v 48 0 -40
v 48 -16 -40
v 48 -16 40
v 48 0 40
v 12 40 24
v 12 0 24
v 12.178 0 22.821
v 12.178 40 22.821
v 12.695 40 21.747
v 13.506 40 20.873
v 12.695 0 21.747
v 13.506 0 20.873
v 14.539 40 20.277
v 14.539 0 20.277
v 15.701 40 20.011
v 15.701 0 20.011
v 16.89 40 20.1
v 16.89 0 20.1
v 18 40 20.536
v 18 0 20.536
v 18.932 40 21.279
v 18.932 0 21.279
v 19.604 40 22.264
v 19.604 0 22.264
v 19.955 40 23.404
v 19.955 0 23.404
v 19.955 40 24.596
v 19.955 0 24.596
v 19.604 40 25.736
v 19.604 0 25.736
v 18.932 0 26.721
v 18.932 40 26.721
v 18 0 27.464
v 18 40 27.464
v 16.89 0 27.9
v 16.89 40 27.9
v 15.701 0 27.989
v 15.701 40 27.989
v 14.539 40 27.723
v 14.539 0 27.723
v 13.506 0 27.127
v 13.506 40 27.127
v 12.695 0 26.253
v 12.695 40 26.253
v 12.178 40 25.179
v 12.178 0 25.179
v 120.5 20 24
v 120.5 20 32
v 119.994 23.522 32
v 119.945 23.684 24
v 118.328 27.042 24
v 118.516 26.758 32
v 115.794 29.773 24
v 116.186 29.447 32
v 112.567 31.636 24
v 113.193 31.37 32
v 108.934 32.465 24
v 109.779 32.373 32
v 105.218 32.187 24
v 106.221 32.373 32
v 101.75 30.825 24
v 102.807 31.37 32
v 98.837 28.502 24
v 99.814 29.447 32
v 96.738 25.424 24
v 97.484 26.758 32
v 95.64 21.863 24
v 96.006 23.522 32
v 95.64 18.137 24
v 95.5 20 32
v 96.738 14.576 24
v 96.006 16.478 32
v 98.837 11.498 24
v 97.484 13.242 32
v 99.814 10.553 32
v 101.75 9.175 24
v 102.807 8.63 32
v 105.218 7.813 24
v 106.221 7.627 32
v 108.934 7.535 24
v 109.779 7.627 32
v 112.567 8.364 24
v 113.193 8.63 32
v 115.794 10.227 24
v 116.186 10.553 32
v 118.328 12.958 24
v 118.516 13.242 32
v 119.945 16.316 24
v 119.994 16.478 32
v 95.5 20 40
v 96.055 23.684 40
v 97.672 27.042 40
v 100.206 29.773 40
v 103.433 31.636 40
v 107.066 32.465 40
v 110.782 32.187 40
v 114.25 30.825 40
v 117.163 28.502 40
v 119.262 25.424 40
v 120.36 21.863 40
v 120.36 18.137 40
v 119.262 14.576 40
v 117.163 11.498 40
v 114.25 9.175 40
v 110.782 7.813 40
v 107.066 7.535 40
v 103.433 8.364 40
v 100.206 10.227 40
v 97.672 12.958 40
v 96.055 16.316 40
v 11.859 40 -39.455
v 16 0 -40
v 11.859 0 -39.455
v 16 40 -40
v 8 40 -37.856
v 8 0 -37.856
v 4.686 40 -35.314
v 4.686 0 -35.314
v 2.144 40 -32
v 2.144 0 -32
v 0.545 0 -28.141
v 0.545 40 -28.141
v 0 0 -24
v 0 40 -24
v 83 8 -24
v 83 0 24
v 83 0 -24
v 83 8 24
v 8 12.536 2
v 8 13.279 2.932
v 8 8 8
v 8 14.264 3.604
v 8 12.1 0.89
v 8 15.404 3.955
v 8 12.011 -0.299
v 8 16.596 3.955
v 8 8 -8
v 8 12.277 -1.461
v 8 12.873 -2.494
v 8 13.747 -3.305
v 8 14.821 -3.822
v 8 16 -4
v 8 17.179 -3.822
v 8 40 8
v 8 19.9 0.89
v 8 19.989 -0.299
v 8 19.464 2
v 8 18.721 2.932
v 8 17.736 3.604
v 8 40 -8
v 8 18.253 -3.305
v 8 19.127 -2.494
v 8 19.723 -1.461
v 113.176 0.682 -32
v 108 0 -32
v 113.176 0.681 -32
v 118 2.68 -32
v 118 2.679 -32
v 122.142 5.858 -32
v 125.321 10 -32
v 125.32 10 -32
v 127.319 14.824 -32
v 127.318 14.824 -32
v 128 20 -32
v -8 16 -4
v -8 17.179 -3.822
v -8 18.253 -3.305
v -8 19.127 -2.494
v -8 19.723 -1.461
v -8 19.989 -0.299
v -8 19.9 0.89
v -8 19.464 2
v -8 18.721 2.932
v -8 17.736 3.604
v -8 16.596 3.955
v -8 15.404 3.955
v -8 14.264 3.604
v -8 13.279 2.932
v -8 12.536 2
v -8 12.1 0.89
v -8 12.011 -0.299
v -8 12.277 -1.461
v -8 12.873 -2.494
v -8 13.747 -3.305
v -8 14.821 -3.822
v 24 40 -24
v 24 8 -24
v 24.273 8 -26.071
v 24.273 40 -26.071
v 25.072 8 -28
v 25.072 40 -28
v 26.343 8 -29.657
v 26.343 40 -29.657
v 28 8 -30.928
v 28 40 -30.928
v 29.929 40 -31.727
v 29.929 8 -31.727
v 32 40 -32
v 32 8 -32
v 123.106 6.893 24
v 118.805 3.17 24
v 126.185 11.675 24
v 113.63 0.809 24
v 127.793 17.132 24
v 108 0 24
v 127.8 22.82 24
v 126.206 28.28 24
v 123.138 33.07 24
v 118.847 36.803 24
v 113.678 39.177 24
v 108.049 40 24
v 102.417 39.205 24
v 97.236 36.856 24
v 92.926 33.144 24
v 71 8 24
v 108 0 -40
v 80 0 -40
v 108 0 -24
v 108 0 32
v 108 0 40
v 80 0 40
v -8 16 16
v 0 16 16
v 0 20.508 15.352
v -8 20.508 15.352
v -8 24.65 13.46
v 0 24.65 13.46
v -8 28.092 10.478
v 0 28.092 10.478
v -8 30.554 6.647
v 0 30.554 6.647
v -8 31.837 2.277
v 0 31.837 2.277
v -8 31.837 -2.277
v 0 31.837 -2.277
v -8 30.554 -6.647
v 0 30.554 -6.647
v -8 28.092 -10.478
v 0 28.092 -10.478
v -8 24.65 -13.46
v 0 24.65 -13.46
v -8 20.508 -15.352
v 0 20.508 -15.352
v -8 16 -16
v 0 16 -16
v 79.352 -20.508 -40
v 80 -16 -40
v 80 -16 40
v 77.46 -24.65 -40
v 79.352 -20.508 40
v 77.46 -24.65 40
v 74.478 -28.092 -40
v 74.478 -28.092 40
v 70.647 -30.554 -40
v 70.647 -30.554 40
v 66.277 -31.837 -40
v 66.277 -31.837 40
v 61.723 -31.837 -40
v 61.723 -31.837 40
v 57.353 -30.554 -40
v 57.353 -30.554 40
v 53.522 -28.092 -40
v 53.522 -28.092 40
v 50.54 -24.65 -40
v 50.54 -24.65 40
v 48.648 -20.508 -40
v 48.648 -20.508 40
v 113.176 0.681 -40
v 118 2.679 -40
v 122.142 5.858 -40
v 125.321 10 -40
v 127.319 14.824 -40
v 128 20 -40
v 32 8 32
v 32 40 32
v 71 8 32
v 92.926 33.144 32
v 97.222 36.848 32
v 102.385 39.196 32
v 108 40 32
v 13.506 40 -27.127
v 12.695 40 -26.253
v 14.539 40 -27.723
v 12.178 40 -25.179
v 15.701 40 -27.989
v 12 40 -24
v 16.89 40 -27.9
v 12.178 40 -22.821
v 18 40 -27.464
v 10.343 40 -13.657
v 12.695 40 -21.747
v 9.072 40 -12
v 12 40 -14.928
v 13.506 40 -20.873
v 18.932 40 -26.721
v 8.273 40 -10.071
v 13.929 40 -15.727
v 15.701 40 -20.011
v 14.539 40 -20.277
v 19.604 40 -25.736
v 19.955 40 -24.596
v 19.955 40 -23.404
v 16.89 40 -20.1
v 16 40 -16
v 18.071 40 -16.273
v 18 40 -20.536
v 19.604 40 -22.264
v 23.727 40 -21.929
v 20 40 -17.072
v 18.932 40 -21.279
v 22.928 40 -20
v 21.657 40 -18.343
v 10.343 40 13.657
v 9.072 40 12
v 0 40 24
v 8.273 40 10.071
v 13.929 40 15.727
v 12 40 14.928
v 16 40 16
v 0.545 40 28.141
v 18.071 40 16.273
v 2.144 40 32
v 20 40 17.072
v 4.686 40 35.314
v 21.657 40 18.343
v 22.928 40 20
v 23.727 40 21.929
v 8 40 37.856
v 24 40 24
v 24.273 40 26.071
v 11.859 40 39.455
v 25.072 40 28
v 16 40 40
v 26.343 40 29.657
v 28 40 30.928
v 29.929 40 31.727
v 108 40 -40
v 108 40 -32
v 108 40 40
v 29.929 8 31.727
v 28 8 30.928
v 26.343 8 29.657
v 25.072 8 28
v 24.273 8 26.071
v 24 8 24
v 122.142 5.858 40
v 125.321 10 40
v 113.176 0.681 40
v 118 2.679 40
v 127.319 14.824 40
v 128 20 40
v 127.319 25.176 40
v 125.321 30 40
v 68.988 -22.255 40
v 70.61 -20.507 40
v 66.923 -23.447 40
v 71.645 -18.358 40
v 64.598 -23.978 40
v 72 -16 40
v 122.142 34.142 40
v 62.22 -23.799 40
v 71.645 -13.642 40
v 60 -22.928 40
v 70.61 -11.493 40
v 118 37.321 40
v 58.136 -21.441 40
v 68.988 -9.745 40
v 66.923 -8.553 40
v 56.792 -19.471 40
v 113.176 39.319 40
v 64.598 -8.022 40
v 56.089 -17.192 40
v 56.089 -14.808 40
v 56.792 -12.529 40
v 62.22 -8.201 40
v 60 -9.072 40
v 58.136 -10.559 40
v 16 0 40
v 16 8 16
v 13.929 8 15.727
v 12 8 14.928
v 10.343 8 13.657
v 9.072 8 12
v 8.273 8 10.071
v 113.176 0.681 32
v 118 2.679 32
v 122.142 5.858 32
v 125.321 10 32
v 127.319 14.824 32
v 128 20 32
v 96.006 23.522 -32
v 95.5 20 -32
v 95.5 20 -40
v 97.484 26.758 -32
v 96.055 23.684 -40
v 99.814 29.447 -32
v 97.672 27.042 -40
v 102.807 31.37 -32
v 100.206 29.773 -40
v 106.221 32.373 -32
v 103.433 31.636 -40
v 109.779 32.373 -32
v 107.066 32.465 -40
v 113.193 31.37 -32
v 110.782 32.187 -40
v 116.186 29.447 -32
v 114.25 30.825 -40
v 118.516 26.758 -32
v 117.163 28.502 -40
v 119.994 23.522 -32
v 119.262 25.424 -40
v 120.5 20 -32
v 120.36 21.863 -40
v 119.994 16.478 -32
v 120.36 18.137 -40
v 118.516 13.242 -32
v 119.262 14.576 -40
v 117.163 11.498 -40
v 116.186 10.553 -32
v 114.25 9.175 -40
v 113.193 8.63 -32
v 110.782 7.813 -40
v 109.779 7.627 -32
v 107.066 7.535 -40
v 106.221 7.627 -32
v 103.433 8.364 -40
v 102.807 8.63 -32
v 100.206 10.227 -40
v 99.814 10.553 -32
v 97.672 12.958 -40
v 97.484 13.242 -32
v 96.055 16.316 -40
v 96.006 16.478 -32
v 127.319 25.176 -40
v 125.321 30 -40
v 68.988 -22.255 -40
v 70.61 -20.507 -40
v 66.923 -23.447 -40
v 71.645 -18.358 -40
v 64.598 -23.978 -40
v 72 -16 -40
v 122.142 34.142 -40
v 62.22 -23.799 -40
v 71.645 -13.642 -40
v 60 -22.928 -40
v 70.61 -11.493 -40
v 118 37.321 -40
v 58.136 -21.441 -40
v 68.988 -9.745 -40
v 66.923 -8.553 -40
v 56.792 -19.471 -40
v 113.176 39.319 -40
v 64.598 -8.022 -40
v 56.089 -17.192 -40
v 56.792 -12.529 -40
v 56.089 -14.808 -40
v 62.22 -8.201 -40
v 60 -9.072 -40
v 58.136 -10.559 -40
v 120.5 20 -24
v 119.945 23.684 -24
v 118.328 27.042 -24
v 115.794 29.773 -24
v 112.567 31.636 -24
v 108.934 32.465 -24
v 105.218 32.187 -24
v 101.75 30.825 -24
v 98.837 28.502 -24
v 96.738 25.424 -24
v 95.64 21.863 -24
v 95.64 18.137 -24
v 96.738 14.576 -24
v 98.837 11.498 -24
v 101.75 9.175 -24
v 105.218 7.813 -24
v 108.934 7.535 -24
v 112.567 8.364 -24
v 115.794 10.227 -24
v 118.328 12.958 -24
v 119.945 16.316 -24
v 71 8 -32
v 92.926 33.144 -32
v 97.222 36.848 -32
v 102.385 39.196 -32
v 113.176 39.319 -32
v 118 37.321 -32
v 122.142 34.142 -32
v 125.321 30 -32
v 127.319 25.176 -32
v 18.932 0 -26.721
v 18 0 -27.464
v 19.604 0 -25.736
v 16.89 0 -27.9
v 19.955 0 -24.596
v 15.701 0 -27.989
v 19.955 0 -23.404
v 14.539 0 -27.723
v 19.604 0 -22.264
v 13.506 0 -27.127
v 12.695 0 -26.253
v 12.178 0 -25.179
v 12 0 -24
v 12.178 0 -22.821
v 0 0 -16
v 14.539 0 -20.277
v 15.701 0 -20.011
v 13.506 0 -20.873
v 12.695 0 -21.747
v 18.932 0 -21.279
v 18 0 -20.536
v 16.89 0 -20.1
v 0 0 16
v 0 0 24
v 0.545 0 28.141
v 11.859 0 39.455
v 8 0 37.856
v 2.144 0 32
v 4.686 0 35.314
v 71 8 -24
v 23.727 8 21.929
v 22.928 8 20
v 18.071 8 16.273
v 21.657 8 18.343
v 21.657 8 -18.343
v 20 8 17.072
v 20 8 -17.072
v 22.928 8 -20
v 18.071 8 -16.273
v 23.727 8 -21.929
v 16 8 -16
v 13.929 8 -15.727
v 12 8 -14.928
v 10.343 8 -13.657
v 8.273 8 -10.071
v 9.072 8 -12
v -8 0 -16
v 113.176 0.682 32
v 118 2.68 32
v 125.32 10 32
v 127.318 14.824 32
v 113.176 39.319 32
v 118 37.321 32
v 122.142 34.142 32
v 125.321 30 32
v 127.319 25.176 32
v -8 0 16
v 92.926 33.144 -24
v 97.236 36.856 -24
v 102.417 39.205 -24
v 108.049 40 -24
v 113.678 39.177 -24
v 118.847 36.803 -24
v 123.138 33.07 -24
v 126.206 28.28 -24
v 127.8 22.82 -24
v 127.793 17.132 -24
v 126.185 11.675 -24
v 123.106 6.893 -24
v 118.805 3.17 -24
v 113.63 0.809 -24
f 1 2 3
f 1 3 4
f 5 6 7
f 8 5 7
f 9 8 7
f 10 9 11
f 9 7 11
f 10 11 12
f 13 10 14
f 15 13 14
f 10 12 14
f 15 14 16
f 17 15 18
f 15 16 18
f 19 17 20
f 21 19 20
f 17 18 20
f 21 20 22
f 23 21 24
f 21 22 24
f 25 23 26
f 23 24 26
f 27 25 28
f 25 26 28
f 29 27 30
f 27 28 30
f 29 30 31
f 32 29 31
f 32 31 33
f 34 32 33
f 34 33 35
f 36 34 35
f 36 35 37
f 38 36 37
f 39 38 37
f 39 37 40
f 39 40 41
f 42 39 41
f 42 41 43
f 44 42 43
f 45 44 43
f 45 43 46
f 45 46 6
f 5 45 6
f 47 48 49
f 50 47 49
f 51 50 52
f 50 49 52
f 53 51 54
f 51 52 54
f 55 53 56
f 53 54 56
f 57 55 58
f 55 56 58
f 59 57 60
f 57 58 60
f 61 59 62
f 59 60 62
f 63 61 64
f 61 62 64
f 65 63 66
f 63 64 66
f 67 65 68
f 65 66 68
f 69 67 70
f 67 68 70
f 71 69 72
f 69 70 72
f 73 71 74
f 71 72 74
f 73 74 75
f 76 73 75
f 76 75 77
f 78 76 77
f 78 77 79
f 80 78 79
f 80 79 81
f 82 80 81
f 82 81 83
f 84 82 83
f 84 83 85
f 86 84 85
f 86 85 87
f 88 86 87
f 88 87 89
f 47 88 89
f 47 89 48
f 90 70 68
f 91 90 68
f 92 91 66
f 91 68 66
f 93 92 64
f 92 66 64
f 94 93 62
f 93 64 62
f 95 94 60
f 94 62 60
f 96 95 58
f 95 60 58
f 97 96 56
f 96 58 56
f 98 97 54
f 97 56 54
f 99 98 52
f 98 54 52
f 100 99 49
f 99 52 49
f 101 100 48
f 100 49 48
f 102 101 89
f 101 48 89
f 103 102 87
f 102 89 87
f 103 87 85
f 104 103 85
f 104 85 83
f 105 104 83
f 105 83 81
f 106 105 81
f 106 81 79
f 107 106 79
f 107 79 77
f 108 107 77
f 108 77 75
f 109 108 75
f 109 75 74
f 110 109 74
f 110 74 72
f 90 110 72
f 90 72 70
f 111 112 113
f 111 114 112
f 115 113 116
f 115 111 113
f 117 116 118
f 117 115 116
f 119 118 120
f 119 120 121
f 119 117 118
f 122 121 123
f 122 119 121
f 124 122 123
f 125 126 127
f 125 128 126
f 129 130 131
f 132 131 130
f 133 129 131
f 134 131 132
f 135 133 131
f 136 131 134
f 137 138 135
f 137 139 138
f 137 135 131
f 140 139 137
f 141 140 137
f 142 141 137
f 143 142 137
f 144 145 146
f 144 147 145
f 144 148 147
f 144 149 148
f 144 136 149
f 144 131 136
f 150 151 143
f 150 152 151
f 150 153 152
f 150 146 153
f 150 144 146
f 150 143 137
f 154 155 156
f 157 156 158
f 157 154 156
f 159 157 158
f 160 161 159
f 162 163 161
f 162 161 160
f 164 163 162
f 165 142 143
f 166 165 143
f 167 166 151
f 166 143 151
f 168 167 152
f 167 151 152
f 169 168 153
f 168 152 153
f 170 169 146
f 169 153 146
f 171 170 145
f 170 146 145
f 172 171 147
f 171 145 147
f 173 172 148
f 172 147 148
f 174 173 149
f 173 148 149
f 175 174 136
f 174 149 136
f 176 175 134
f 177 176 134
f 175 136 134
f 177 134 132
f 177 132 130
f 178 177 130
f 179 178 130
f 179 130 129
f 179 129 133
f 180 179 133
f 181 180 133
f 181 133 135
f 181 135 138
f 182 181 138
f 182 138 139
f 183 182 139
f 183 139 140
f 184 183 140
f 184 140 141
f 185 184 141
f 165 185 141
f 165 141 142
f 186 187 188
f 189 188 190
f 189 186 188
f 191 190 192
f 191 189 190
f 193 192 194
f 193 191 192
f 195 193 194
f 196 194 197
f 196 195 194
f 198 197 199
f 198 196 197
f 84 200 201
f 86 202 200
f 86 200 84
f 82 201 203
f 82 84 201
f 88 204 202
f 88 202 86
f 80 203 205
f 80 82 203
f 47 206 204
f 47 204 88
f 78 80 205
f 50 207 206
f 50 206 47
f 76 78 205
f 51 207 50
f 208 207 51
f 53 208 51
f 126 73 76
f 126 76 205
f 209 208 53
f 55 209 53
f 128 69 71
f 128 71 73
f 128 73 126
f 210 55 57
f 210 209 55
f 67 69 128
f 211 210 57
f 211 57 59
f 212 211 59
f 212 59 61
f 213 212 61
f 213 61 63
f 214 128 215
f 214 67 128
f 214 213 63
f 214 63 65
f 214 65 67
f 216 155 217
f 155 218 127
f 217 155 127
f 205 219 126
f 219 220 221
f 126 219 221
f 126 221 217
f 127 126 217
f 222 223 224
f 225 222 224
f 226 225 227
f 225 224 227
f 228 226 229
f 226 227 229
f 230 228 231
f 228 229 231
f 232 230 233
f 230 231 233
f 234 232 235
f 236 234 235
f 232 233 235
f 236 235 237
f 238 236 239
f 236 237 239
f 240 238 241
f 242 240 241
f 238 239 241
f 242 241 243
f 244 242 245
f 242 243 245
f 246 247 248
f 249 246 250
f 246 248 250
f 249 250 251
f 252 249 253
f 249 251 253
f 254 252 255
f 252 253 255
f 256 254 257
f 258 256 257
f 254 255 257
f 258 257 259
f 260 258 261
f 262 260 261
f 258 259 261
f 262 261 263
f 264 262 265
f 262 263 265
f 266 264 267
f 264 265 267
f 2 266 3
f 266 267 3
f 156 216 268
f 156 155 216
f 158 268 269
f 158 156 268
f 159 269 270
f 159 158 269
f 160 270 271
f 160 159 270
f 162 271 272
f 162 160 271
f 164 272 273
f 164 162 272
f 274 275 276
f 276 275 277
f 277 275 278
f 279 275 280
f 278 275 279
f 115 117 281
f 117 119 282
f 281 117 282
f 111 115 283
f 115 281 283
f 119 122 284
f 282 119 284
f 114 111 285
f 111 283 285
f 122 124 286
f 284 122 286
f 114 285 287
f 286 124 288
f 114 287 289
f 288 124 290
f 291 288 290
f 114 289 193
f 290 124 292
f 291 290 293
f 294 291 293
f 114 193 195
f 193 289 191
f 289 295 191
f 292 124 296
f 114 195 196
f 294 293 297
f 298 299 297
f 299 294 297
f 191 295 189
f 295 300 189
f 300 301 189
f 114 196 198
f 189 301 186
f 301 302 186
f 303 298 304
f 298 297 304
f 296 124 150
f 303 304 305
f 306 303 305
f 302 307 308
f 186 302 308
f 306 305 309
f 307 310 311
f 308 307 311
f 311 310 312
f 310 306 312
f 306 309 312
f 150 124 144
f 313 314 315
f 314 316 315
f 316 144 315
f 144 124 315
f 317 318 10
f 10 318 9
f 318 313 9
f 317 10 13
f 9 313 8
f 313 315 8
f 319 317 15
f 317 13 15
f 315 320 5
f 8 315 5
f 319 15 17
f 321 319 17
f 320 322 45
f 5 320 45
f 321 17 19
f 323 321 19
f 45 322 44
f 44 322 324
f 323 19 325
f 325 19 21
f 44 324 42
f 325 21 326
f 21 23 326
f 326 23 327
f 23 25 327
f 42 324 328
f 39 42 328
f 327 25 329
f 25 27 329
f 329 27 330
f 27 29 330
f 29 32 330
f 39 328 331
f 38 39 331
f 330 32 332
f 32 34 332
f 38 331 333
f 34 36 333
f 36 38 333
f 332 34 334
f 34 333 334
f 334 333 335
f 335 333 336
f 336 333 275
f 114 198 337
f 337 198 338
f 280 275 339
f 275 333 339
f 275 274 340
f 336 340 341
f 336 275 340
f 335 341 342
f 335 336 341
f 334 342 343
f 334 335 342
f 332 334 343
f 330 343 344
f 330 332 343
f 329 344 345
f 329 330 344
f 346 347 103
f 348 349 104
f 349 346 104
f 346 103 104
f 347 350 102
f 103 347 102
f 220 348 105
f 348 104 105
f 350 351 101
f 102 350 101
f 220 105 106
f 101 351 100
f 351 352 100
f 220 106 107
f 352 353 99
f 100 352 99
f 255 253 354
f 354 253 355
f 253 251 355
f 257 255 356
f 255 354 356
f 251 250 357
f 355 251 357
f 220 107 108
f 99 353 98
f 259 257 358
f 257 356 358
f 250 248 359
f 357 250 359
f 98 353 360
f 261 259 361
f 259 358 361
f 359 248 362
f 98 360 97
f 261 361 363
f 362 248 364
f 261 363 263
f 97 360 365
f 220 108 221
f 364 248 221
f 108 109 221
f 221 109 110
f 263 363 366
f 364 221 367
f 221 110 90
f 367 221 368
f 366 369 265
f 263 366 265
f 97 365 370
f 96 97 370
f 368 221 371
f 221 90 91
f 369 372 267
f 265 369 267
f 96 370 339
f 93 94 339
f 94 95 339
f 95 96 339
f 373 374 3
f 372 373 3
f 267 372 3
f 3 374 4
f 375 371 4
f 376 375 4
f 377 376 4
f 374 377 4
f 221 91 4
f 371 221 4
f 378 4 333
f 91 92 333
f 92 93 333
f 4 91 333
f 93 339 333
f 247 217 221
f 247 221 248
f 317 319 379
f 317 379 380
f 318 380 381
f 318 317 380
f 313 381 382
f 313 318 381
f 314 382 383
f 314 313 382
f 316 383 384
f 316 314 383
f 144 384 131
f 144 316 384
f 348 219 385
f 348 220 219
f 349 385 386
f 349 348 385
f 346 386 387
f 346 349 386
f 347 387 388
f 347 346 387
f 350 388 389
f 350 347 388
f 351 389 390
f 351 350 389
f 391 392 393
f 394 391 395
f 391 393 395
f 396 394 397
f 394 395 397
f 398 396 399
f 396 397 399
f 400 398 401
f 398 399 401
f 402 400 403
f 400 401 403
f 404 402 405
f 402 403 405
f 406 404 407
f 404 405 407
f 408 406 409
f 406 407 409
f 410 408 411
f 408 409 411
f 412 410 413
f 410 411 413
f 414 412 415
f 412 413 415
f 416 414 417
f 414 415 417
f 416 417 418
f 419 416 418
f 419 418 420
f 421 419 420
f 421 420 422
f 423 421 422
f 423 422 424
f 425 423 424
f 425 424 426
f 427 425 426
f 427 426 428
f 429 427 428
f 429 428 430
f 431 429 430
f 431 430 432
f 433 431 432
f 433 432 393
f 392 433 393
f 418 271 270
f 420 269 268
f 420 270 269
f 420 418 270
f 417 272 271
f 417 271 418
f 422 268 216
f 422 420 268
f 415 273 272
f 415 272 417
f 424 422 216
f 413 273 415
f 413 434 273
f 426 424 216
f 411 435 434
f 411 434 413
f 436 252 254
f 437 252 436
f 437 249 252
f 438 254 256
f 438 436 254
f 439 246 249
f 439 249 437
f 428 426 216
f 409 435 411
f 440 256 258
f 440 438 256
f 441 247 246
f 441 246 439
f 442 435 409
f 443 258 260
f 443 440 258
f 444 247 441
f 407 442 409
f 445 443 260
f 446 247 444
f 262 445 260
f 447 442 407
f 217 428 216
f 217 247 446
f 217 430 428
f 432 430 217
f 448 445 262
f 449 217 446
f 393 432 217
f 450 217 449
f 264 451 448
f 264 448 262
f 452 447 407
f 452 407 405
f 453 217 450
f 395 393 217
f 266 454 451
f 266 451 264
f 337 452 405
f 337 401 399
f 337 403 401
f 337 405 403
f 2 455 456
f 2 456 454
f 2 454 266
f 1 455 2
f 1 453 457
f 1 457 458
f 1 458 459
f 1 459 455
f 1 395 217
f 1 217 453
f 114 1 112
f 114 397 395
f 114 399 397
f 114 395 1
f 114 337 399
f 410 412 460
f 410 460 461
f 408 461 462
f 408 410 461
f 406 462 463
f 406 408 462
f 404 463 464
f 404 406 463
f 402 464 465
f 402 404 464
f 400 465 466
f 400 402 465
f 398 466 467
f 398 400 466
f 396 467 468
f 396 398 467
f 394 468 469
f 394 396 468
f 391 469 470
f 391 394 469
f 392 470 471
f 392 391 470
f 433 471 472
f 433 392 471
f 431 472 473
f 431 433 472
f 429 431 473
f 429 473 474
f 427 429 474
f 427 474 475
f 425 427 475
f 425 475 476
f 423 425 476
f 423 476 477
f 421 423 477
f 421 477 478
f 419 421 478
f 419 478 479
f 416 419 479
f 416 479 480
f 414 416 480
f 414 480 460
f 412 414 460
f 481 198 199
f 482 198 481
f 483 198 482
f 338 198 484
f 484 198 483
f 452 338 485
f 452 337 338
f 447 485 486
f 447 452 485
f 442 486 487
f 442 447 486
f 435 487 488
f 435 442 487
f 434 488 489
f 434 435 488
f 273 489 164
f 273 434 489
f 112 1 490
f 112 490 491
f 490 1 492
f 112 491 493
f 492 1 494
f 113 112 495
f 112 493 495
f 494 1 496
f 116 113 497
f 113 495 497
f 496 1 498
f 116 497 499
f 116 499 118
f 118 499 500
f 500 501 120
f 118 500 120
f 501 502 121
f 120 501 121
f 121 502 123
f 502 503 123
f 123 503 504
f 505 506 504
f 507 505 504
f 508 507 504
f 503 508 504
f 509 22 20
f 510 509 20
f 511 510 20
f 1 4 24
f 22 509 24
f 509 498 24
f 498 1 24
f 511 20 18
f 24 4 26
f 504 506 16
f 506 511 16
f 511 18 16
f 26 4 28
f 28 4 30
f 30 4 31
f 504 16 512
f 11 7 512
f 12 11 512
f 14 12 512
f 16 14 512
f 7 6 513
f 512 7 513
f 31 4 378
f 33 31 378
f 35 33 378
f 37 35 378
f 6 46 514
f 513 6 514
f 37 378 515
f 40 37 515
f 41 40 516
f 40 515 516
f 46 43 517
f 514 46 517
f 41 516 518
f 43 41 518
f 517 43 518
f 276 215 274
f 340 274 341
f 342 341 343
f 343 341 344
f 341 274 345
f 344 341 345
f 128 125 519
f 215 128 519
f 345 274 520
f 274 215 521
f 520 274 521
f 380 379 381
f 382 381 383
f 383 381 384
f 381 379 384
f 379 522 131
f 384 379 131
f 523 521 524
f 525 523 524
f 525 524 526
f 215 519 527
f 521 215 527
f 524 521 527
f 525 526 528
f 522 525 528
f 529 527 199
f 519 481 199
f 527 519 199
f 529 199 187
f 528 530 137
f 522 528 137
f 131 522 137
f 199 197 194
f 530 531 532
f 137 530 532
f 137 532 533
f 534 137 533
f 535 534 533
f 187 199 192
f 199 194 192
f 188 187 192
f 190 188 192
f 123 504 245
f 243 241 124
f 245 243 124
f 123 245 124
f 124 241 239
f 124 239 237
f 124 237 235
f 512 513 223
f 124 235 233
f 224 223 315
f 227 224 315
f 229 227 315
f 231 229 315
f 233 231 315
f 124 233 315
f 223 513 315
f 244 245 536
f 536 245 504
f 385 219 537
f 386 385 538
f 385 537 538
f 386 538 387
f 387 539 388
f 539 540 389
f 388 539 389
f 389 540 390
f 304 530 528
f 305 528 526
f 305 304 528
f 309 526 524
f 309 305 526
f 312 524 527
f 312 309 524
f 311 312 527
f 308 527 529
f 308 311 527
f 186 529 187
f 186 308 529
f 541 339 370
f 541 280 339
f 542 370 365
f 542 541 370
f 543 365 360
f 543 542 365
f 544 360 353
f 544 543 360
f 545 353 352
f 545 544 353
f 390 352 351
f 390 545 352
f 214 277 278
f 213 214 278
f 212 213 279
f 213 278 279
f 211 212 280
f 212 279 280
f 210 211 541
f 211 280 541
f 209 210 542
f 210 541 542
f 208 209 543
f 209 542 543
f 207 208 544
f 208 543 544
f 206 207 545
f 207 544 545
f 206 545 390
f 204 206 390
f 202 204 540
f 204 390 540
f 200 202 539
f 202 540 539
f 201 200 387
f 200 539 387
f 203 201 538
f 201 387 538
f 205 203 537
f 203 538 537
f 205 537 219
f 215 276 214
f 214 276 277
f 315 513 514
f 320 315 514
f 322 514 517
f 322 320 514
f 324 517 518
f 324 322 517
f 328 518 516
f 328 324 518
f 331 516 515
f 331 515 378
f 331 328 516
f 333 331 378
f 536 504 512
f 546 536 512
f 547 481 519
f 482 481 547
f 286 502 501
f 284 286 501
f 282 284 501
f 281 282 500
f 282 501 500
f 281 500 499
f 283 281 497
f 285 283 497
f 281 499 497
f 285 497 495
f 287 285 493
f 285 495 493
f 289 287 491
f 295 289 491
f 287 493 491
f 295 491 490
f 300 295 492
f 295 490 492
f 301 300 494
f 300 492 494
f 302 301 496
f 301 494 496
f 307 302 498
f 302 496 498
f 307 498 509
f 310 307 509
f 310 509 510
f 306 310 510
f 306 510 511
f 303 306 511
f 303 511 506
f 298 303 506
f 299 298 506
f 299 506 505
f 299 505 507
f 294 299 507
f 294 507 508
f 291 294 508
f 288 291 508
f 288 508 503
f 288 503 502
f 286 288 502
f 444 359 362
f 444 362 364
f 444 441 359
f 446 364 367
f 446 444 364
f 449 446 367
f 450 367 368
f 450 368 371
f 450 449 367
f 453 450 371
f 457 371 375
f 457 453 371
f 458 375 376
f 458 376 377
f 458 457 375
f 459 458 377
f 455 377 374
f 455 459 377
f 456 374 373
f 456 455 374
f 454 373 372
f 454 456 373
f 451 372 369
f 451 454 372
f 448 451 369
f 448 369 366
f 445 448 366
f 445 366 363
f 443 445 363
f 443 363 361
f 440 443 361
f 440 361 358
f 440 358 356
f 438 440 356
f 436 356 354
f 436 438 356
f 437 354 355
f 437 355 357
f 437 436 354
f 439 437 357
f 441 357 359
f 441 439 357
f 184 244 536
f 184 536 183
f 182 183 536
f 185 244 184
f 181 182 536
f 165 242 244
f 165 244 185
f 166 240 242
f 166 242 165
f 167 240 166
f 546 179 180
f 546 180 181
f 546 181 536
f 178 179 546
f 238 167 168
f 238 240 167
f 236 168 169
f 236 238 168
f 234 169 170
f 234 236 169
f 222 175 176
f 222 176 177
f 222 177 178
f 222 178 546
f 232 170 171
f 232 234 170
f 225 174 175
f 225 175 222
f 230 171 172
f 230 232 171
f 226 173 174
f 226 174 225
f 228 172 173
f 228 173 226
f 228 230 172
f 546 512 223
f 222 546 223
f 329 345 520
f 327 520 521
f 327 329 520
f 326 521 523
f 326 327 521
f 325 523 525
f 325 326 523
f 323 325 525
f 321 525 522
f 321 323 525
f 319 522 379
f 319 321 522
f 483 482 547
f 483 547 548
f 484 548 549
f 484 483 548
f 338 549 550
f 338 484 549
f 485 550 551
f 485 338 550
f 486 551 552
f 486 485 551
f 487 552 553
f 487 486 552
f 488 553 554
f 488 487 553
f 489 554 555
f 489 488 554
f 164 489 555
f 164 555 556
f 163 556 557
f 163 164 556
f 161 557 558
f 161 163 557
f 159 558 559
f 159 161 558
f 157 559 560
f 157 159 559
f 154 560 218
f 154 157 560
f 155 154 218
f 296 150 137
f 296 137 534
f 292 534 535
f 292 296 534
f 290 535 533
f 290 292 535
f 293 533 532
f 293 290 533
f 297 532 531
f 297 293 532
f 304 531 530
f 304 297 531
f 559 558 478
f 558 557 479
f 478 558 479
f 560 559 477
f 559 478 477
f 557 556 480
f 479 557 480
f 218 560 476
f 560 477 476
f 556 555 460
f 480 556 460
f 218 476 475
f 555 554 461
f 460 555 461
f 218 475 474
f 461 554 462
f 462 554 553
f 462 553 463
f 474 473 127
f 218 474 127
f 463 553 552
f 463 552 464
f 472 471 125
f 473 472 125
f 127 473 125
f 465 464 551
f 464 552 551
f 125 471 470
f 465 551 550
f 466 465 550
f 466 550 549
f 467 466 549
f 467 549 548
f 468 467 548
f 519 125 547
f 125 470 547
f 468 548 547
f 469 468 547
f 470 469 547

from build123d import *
from build123d.topology import SkipClean

# Parameters (mm, degrees)
SKETCH1_R           = 8
BOSS_EXTRUDE1_DEPTH = 40
SKETCH2_W           = 45
SKETCH2_H           = 64
CUT_EXTRUDE1_DEPTH  = 80
FILLET1_R           = 20
HOLE1_D             = 25
FILLET2_R           = 16
HOLE2_D             = 8
CUT_EXTRUDE2_DEPTH  = 32
SKETCH8_R           = 12.5
BOSS_EXTRUDE2_DEPTH = 8
BOSS_EXTRUDE3_DEPTH = 8
HOLE3_D             = 8


with BuildPart() as part:
    # Sketch1 → Boss-Extrude1 (new, symmetric)
    with BuildSketch(Plane.XY):
        with BuildLine():
            Line((48, -16), (48, 0))
            Line((48, 0), (0, 0))
            Line((0, 0), (0, 40))
            Line((0, 40), (128, 40))
            Line((128, 40), (128, 0))
            Line((128, 0), (80, 0))
            Line((80, 0), (80, -16))
            ThreePointArc((80, -16), (64, -32), (48, -16))
        make_face()
        with Locations((64, -16)):
            Circle(SKETCH1_R, mode=Mode.SUBTRACT)
    extrude(amount=BOSS_EXTRUDE1_DEPTH, both=True)

    # Sketch2 → Cut-Extrude1 (cut)
    with BuildSketch(Plane(origin=(0, 40, 0), x_dir=(1, 0, 0), z_dir=(0, 1, 0))):
        with Locations((105.5, 0)):
            Rectangle(SKETCH2_W, SKETCH2_H)
    extrude(amount=-CUT_EXTRUDE1_DEPTH, mode=Mode.SUBTRACT)

    # Fillet1
    fillet1_edges = [part.edges().sort_by_distance(p)[0] for p in [
        (128, 0, 36),
        (128, 0, -36),
        (128, 40, -36),
        (128, 40, 36),
    ]]
    fillet(fillet1_edges, radius=FILLET1_R - 0.0001)  # a hair under: the kernel refuses the full size

    # Hole1 (through all)
    with Locations(Plane.XY.offset(40)):
        with Locations((108, 20)):
            Hole(HOLE1_D / 2)

    # Fillet2
    fillet2_edges = [part.edges().sort_by_distance(p)[0] for p in [
        (0, 20, -40),
        (0, 20, 40),
    ]]
    fillet(fillet2_edges, radius=FILLET2_R)

    # Hole2 (through all)
    with Locations(Plane(origin=(0, 40, 0), x_dir=(1, 0, 0), z_dir=(0, 1, 0))):
        with Locations((16, 24), (16, -24)):
            Hole(HOLE2_D / 2)

    # Sketch7 → Cut-Extrude2 (cut)
    with BuildSketch(Plane(origin=(0, 40, 0), x_dir=(1, 0, 0), z_dir=(0, 1, 0))):
        with BuildLine():
            Line((8, -8), (8, 8))
            ThreePointArc((8, 8), (10.343145751, 13.656854249), (16, 16))
            ThreePointArc((16, 16), (21.656854249, 18.343145751), (24, 24))
            ThreePointArc((24, 24), (26.343145751, 29.656854249), (32, 32))
            Line((32, 32), (83, 32))
            Line((83, 32), (83, -32))
            Line((83, -32), (32, -32))
            ThreePointArc((32, -32), (26.343145751, -29.656854249), (24, -24))
            ThreePointArc((24, -24), (21.656854249, -18.343145751), (16, -16))
            ThreePointArc((16, -16), (10.343145751, -13.656854249), (8, -8))
        make_face()
    extrude(amount=-CUT_EXTRUDE2_DEPTH, mode=Mode.SUBTRACT)

    # Sketch8 → Boss-Extrude2 (add)
    with SkipClean():  # the faces are left unmerged after this step: merging them gives an invalid solid
        with BuildSketch(Plane.XY.offset(-32)):
            with BuildLine():
                Line((83, 8), (71, 8))
                Line((71, 8), (92.926108981, 33.14449731))
                ThreePointArc((92.926108981, 33.14449731), (126.205630258, 28.279796308), (108, 0))
                Line((108, 0), (83, 0))
                Line((83, 0), (83, 8))
            make_face()
            with Locations((108, 20)):
                Circle(SKETCH8_R, mode=Mode.SUBTRACT)
        boss_extrude2 = extrude(amount=BOSS_EXTRUDE2_DEPTH)
    add(part.part.scale(1), mode=Mode.REPLACE)  # the faces are merged on a copy

    # Mirror1: Boss-Extrude2 across plane
    add(boss_extrude2.mirror(Plane.XY))

    # Sketch9 → Boss-Extrude3 (add)
    with BuildSketch(Plane.ZY):
        with BuildLine():
            Line((-16, 16), (-16, 0))
            Line((-16, 0), (16, 0))
            Line((16, 0), (16, 16))
            ThreePointArc((16, 16), (0, 32), (-16, 16))
        make_face()
    extrude(amount=BOSS_EXTRUDE3_DEPTH)

    # Hole3 (through all)
    with Locations(Plane.ZY.offset(8)):
        with Locations((0, 16)):
            Hole(HOLE3_D / 2)


solid = part.part
